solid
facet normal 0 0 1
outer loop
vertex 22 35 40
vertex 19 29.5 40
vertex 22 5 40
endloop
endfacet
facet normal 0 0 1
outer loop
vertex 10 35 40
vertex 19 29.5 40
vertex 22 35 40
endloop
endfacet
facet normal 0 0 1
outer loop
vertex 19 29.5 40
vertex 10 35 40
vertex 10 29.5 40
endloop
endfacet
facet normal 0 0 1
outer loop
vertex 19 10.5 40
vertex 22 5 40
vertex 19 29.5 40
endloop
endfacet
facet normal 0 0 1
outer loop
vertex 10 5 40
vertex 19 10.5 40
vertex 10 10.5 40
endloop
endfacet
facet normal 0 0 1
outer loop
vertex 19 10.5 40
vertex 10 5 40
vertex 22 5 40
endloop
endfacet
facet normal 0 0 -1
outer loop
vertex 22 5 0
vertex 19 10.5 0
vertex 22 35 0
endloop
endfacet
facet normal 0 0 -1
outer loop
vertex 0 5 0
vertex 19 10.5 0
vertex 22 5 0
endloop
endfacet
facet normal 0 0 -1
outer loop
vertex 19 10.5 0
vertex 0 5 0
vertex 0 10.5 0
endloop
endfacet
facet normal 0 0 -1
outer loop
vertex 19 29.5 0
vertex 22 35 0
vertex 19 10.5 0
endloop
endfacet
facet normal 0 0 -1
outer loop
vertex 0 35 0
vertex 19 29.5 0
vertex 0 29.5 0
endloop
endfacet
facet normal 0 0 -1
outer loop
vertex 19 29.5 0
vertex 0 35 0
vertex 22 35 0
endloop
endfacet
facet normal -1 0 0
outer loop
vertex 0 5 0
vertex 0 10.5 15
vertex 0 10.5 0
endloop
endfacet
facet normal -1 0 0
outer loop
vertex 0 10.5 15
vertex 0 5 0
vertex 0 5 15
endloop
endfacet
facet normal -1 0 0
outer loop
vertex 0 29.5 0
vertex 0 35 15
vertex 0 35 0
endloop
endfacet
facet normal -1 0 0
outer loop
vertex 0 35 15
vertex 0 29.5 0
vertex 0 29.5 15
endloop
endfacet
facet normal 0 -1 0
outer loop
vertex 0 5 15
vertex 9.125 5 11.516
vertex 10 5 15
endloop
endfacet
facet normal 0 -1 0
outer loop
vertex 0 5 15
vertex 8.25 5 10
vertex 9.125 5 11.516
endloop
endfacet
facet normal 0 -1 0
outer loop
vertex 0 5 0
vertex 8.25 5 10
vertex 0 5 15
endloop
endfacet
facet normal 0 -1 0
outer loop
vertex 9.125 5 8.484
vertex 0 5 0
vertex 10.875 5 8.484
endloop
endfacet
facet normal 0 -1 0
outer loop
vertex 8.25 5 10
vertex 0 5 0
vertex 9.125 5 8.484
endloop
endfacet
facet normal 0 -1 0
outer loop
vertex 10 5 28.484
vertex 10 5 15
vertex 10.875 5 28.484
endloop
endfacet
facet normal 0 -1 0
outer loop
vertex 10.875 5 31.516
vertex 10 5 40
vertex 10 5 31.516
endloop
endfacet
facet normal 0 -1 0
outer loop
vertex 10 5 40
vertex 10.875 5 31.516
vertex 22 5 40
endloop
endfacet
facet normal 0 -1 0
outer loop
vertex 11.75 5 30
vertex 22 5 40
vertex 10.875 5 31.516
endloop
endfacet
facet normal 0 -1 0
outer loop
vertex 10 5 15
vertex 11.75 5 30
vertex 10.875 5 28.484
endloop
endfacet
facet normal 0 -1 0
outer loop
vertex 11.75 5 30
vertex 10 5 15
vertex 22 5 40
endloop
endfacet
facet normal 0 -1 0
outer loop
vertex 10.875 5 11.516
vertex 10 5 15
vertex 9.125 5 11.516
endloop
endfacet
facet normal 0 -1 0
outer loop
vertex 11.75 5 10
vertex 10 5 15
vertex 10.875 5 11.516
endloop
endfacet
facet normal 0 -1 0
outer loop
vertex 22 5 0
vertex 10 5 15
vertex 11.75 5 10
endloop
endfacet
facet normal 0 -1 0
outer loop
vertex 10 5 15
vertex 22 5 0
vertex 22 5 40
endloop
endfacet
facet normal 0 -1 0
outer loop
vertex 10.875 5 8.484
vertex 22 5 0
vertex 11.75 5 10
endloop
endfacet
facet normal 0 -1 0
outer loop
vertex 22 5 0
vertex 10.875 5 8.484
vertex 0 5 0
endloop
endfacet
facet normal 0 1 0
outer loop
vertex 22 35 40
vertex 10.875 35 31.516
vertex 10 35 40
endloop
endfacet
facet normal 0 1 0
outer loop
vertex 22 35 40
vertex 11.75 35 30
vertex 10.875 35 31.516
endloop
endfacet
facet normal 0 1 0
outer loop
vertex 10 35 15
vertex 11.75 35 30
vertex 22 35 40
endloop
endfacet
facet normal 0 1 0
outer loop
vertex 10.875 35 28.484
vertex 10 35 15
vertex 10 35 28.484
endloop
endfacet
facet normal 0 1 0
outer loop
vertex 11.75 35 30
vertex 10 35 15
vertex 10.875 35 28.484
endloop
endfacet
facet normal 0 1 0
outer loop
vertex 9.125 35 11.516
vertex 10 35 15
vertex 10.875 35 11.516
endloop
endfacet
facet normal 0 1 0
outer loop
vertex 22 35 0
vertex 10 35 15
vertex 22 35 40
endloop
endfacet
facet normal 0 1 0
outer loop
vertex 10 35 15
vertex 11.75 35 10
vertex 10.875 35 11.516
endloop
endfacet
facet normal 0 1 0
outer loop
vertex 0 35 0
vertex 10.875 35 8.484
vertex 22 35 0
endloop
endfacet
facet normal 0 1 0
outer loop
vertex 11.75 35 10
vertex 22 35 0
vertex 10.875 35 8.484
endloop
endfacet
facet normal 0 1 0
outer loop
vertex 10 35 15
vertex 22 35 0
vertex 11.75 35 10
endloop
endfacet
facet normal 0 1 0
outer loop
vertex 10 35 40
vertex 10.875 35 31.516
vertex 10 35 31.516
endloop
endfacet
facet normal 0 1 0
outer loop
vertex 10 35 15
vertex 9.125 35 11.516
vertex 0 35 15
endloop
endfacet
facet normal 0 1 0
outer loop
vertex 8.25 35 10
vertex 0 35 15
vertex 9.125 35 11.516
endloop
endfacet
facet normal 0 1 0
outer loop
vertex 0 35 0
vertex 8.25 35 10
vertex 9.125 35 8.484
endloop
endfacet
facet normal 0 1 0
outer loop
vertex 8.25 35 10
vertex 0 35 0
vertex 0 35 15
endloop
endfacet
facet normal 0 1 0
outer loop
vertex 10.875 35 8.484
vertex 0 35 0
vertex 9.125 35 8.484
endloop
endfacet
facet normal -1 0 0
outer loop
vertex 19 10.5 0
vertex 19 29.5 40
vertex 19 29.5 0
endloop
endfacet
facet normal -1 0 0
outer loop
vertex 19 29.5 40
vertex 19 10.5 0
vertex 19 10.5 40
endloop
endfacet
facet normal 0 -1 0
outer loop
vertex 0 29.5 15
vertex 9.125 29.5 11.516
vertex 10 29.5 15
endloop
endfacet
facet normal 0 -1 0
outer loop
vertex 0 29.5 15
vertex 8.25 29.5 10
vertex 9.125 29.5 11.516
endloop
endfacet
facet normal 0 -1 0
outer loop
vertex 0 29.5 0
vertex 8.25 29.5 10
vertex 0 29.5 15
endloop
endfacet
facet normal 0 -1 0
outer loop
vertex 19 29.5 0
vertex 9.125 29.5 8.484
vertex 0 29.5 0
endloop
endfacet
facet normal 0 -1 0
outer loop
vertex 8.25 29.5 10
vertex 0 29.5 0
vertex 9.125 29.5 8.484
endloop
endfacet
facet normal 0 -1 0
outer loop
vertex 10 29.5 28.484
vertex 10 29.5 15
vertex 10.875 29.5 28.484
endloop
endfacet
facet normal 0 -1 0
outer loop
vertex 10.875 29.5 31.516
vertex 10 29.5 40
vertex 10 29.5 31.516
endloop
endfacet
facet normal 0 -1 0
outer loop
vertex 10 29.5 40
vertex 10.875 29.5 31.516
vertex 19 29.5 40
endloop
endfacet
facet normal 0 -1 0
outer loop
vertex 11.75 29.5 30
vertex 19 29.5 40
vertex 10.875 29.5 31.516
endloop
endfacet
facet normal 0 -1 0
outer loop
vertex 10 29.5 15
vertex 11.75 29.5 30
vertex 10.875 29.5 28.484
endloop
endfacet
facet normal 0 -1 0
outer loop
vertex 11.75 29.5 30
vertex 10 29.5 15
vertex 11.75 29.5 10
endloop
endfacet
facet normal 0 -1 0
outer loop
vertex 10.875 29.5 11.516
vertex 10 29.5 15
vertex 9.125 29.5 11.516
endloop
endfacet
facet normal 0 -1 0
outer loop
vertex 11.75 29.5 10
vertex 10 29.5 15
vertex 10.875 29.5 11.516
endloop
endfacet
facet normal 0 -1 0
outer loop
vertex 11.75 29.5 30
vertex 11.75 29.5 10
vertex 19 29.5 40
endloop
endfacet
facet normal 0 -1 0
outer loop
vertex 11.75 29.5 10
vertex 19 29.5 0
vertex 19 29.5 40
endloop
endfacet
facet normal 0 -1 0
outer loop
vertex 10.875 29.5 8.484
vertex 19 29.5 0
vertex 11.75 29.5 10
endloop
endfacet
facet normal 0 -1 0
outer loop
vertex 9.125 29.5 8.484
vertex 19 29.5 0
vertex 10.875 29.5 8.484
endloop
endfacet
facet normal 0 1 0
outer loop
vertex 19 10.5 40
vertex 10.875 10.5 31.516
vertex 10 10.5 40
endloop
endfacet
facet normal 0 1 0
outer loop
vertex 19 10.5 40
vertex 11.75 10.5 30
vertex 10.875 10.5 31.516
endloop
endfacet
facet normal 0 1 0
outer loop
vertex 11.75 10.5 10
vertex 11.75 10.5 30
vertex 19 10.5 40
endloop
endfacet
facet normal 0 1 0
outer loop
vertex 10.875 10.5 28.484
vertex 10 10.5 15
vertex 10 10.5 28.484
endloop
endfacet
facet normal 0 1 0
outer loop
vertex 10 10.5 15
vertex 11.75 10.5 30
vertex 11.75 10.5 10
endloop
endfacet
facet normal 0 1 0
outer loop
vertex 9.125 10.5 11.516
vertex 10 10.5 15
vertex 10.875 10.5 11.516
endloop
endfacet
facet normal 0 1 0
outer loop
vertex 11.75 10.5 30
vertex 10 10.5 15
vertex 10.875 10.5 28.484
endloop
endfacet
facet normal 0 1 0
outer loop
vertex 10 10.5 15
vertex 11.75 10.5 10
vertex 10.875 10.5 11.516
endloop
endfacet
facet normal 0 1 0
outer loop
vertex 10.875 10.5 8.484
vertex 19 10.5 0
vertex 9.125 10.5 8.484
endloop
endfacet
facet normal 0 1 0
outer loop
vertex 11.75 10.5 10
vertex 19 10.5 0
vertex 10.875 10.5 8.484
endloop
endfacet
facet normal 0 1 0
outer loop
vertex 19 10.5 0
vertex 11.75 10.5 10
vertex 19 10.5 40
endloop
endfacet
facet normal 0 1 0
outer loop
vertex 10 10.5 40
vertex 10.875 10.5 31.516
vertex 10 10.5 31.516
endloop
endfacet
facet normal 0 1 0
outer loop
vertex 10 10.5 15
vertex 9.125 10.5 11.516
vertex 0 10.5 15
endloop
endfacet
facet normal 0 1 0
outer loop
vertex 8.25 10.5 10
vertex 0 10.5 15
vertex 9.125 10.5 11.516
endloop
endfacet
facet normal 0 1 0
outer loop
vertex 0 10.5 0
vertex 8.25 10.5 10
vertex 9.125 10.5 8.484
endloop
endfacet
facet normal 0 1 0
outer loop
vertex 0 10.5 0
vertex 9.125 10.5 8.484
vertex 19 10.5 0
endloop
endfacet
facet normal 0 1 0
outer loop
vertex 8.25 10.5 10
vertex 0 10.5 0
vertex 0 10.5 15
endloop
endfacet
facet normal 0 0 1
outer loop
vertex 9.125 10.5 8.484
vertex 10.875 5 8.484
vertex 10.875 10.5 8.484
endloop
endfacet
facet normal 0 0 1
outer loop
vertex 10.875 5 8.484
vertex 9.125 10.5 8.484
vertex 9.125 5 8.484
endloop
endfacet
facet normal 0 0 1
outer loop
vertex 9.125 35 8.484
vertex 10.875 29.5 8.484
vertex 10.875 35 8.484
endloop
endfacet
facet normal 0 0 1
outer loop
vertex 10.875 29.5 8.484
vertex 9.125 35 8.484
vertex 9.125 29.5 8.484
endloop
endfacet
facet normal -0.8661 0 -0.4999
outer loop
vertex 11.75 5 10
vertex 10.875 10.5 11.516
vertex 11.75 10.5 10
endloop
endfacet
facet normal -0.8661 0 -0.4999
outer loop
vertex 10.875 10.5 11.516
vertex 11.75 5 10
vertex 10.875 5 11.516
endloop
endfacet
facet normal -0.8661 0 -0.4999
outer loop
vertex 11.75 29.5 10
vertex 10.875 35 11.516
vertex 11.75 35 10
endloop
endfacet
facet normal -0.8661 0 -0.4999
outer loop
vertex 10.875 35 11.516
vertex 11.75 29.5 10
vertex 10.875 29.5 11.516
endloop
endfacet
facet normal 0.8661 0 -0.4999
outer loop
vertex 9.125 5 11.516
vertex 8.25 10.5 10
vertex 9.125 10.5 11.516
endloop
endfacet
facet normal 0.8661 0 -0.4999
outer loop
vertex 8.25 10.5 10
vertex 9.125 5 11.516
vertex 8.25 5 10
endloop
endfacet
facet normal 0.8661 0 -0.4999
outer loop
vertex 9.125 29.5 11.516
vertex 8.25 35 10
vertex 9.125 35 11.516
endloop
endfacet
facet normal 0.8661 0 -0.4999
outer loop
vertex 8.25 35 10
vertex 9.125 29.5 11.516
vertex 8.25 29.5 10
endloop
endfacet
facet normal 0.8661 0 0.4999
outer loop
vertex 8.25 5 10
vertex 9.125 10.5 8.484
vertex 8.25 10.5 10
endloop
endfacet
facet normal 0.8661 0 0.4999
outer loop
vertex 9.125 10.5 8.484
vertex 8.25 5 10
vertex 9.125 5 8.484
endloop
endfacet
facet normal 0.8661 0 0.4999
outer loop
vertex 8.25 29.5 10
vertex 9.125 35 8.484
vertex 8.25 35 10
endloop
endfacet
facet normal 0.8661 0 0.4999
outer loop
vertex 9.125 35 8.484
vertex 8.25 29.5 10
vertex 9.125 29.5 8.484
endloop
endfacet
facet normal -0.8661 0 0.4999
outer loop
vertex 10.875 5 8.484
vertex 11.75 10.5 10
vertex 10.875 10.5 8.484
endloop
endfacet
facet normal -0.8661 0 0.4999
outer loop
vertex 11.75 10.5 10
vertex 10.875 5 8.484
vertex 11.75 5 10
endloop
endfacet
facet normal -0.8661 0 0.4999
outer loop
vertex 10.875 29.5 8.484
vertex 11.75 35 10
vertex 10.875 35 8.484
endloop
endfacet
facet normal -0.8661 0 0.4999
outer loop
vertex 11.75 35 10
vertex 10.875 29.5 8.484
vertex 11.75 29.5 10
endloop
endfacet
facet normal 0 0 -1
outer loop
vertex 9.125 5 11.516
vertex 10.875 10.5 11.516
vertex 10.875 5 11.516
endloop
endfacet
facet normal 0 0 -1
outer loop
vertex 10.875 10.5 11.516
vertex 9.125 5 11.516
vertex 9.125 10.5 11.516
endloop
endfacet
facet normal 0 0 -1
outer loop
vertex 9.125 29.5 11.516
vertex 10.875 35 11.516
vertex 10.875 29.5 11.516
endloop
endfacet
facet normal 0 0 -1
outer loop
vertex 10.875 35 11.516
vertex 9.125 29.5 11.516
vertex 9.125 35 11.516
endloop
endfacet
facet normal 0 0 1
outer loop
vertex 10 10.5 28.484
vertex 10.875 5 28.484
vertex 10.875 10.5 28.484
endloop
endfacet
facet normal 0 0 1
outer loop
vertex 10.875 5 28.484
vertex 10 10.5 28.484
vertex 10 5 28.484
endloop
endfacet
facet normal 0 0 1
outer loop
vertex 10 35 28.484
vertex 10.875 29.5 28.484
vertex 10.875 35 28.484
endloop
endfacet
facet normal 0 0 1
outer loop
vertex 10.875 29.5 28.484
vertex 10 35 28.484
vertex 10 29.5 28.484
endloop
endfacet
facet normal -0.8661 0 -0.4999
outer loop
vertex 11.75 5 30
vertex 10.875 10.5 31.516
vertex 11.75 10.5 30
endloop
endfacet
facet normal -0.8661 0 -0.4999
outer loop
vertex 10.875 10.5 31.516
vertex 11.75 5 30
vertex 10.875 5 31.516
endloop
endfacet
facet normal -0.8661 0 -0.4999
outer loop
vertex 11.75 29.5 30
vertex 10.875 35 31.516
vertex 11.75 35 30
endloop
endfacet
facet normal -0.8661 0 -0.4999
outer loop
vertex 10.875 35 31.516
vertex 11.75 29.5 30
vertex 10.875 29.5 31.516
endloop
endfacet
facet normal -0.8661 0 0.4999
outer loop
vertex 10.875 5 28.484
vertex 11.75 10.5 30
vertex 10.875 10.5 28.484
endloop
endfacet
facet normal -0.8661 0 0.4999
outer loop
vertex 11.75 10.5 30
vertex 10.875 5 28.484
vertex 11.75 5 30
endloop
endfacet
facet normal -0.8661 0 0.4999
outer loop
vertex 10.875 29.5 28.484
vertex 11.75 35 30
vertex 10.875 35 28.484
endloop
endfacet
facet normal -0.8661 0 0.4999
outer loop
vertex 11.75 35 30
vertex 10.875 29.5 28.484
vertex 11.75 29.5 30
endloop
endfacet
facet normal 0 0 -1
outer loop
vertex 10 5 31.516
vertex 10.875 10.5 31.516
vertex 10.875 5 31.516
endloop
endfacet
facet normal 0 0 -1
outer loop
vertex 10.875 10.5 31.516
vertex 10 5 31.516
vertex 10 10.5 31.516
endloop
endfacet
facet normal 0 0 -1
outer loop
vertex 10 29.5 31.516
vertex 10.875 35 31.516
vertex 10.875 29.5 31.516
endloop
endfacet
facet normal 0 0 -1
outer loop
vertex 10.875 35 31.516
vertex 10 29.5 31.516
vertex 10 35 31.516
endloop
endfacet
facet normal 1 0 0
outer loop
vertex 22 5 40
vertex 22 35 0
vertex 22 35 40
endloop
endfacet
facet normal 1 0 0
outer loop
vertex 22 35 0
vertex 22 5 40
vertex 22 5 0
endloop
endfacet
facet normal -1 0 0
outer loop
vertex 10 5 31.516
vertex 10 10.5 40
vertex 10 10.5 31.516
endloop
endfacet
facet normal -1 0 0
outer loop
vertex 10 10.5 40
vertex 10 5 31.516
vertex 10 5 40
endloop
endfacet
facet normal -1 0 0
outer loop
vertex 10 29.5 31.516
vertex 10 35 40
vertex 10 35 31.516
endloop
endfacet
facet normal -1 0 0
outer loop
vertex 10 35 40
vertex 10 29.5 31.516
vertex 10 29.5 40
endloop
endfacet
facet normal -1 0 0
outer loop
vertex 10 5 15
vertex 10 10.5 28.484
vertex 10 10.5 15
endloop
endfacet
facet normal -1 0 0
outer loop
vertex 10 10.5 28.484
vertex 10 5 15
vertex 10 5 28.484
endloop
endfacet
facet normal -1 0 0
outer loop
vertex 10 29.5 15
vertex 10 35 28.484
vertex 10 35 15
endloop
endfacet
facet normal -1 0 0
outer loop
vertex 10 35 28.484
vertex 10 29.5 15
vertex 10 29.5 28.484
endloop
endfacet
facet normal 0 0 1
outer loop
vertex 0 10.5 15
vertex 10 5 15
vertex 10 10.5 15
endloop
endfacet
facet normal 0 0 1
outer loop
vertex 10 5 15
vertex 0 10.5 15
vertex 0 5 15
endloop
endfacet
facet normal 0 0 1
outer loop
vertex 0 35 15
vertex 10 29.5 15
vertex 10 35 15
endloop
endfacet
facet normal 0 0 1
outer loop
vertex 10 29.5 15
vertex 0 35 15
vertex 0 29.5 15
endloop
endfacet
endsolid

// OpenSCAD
//
// Gate Hinge 
//
// This thing makes hinge you can use to swing a wooden baby gate.
//
// Instructions
// The hinge uses a 1/2" eyehook for the pivot. You also need two
// 8mm x 50mm pins. To install, remove the existing hardware on
// one side of the gate and use tapered wood screws (8) to 
// secure the hinge to the gate. Mount the eyehooks and use the
// pins to attach the hinges. Hold the gate so that the hinges
// slip into place and then secure the hinges in place with the
// tapered screws. Mischief managed!
//
// Created by: Charles Bell
//
// Enjoy!
// 
module gate_bracket() {
  difference() {
    union() {
      translate([0,5,0]) cube([35,25,40]);
      translate([0,5,0]) cube([40,30,40]);
      translate([40,20,0]) cylinder(40,15,15);
    }
    translate([0,10.5,0]) cube([19,19,50]);
    translate([40,20,0]) cylinder(55,4.3,4.3);
    rotate([90,0,0]) translate([10,10,-50]) cylinder(75,1.75,1.75);
    rotate([90,0,0]) translate([10,30,-50]) cylinder(75,1.75,1.75);
    translate([40,20,15]) cylinder(8,16,16);
  }
}

difference() {
  gate_bracket();
  translate([22,0,0]) cube([40,40,40]);
  translate([0,0,15]) cube([10,40,40]);
}
